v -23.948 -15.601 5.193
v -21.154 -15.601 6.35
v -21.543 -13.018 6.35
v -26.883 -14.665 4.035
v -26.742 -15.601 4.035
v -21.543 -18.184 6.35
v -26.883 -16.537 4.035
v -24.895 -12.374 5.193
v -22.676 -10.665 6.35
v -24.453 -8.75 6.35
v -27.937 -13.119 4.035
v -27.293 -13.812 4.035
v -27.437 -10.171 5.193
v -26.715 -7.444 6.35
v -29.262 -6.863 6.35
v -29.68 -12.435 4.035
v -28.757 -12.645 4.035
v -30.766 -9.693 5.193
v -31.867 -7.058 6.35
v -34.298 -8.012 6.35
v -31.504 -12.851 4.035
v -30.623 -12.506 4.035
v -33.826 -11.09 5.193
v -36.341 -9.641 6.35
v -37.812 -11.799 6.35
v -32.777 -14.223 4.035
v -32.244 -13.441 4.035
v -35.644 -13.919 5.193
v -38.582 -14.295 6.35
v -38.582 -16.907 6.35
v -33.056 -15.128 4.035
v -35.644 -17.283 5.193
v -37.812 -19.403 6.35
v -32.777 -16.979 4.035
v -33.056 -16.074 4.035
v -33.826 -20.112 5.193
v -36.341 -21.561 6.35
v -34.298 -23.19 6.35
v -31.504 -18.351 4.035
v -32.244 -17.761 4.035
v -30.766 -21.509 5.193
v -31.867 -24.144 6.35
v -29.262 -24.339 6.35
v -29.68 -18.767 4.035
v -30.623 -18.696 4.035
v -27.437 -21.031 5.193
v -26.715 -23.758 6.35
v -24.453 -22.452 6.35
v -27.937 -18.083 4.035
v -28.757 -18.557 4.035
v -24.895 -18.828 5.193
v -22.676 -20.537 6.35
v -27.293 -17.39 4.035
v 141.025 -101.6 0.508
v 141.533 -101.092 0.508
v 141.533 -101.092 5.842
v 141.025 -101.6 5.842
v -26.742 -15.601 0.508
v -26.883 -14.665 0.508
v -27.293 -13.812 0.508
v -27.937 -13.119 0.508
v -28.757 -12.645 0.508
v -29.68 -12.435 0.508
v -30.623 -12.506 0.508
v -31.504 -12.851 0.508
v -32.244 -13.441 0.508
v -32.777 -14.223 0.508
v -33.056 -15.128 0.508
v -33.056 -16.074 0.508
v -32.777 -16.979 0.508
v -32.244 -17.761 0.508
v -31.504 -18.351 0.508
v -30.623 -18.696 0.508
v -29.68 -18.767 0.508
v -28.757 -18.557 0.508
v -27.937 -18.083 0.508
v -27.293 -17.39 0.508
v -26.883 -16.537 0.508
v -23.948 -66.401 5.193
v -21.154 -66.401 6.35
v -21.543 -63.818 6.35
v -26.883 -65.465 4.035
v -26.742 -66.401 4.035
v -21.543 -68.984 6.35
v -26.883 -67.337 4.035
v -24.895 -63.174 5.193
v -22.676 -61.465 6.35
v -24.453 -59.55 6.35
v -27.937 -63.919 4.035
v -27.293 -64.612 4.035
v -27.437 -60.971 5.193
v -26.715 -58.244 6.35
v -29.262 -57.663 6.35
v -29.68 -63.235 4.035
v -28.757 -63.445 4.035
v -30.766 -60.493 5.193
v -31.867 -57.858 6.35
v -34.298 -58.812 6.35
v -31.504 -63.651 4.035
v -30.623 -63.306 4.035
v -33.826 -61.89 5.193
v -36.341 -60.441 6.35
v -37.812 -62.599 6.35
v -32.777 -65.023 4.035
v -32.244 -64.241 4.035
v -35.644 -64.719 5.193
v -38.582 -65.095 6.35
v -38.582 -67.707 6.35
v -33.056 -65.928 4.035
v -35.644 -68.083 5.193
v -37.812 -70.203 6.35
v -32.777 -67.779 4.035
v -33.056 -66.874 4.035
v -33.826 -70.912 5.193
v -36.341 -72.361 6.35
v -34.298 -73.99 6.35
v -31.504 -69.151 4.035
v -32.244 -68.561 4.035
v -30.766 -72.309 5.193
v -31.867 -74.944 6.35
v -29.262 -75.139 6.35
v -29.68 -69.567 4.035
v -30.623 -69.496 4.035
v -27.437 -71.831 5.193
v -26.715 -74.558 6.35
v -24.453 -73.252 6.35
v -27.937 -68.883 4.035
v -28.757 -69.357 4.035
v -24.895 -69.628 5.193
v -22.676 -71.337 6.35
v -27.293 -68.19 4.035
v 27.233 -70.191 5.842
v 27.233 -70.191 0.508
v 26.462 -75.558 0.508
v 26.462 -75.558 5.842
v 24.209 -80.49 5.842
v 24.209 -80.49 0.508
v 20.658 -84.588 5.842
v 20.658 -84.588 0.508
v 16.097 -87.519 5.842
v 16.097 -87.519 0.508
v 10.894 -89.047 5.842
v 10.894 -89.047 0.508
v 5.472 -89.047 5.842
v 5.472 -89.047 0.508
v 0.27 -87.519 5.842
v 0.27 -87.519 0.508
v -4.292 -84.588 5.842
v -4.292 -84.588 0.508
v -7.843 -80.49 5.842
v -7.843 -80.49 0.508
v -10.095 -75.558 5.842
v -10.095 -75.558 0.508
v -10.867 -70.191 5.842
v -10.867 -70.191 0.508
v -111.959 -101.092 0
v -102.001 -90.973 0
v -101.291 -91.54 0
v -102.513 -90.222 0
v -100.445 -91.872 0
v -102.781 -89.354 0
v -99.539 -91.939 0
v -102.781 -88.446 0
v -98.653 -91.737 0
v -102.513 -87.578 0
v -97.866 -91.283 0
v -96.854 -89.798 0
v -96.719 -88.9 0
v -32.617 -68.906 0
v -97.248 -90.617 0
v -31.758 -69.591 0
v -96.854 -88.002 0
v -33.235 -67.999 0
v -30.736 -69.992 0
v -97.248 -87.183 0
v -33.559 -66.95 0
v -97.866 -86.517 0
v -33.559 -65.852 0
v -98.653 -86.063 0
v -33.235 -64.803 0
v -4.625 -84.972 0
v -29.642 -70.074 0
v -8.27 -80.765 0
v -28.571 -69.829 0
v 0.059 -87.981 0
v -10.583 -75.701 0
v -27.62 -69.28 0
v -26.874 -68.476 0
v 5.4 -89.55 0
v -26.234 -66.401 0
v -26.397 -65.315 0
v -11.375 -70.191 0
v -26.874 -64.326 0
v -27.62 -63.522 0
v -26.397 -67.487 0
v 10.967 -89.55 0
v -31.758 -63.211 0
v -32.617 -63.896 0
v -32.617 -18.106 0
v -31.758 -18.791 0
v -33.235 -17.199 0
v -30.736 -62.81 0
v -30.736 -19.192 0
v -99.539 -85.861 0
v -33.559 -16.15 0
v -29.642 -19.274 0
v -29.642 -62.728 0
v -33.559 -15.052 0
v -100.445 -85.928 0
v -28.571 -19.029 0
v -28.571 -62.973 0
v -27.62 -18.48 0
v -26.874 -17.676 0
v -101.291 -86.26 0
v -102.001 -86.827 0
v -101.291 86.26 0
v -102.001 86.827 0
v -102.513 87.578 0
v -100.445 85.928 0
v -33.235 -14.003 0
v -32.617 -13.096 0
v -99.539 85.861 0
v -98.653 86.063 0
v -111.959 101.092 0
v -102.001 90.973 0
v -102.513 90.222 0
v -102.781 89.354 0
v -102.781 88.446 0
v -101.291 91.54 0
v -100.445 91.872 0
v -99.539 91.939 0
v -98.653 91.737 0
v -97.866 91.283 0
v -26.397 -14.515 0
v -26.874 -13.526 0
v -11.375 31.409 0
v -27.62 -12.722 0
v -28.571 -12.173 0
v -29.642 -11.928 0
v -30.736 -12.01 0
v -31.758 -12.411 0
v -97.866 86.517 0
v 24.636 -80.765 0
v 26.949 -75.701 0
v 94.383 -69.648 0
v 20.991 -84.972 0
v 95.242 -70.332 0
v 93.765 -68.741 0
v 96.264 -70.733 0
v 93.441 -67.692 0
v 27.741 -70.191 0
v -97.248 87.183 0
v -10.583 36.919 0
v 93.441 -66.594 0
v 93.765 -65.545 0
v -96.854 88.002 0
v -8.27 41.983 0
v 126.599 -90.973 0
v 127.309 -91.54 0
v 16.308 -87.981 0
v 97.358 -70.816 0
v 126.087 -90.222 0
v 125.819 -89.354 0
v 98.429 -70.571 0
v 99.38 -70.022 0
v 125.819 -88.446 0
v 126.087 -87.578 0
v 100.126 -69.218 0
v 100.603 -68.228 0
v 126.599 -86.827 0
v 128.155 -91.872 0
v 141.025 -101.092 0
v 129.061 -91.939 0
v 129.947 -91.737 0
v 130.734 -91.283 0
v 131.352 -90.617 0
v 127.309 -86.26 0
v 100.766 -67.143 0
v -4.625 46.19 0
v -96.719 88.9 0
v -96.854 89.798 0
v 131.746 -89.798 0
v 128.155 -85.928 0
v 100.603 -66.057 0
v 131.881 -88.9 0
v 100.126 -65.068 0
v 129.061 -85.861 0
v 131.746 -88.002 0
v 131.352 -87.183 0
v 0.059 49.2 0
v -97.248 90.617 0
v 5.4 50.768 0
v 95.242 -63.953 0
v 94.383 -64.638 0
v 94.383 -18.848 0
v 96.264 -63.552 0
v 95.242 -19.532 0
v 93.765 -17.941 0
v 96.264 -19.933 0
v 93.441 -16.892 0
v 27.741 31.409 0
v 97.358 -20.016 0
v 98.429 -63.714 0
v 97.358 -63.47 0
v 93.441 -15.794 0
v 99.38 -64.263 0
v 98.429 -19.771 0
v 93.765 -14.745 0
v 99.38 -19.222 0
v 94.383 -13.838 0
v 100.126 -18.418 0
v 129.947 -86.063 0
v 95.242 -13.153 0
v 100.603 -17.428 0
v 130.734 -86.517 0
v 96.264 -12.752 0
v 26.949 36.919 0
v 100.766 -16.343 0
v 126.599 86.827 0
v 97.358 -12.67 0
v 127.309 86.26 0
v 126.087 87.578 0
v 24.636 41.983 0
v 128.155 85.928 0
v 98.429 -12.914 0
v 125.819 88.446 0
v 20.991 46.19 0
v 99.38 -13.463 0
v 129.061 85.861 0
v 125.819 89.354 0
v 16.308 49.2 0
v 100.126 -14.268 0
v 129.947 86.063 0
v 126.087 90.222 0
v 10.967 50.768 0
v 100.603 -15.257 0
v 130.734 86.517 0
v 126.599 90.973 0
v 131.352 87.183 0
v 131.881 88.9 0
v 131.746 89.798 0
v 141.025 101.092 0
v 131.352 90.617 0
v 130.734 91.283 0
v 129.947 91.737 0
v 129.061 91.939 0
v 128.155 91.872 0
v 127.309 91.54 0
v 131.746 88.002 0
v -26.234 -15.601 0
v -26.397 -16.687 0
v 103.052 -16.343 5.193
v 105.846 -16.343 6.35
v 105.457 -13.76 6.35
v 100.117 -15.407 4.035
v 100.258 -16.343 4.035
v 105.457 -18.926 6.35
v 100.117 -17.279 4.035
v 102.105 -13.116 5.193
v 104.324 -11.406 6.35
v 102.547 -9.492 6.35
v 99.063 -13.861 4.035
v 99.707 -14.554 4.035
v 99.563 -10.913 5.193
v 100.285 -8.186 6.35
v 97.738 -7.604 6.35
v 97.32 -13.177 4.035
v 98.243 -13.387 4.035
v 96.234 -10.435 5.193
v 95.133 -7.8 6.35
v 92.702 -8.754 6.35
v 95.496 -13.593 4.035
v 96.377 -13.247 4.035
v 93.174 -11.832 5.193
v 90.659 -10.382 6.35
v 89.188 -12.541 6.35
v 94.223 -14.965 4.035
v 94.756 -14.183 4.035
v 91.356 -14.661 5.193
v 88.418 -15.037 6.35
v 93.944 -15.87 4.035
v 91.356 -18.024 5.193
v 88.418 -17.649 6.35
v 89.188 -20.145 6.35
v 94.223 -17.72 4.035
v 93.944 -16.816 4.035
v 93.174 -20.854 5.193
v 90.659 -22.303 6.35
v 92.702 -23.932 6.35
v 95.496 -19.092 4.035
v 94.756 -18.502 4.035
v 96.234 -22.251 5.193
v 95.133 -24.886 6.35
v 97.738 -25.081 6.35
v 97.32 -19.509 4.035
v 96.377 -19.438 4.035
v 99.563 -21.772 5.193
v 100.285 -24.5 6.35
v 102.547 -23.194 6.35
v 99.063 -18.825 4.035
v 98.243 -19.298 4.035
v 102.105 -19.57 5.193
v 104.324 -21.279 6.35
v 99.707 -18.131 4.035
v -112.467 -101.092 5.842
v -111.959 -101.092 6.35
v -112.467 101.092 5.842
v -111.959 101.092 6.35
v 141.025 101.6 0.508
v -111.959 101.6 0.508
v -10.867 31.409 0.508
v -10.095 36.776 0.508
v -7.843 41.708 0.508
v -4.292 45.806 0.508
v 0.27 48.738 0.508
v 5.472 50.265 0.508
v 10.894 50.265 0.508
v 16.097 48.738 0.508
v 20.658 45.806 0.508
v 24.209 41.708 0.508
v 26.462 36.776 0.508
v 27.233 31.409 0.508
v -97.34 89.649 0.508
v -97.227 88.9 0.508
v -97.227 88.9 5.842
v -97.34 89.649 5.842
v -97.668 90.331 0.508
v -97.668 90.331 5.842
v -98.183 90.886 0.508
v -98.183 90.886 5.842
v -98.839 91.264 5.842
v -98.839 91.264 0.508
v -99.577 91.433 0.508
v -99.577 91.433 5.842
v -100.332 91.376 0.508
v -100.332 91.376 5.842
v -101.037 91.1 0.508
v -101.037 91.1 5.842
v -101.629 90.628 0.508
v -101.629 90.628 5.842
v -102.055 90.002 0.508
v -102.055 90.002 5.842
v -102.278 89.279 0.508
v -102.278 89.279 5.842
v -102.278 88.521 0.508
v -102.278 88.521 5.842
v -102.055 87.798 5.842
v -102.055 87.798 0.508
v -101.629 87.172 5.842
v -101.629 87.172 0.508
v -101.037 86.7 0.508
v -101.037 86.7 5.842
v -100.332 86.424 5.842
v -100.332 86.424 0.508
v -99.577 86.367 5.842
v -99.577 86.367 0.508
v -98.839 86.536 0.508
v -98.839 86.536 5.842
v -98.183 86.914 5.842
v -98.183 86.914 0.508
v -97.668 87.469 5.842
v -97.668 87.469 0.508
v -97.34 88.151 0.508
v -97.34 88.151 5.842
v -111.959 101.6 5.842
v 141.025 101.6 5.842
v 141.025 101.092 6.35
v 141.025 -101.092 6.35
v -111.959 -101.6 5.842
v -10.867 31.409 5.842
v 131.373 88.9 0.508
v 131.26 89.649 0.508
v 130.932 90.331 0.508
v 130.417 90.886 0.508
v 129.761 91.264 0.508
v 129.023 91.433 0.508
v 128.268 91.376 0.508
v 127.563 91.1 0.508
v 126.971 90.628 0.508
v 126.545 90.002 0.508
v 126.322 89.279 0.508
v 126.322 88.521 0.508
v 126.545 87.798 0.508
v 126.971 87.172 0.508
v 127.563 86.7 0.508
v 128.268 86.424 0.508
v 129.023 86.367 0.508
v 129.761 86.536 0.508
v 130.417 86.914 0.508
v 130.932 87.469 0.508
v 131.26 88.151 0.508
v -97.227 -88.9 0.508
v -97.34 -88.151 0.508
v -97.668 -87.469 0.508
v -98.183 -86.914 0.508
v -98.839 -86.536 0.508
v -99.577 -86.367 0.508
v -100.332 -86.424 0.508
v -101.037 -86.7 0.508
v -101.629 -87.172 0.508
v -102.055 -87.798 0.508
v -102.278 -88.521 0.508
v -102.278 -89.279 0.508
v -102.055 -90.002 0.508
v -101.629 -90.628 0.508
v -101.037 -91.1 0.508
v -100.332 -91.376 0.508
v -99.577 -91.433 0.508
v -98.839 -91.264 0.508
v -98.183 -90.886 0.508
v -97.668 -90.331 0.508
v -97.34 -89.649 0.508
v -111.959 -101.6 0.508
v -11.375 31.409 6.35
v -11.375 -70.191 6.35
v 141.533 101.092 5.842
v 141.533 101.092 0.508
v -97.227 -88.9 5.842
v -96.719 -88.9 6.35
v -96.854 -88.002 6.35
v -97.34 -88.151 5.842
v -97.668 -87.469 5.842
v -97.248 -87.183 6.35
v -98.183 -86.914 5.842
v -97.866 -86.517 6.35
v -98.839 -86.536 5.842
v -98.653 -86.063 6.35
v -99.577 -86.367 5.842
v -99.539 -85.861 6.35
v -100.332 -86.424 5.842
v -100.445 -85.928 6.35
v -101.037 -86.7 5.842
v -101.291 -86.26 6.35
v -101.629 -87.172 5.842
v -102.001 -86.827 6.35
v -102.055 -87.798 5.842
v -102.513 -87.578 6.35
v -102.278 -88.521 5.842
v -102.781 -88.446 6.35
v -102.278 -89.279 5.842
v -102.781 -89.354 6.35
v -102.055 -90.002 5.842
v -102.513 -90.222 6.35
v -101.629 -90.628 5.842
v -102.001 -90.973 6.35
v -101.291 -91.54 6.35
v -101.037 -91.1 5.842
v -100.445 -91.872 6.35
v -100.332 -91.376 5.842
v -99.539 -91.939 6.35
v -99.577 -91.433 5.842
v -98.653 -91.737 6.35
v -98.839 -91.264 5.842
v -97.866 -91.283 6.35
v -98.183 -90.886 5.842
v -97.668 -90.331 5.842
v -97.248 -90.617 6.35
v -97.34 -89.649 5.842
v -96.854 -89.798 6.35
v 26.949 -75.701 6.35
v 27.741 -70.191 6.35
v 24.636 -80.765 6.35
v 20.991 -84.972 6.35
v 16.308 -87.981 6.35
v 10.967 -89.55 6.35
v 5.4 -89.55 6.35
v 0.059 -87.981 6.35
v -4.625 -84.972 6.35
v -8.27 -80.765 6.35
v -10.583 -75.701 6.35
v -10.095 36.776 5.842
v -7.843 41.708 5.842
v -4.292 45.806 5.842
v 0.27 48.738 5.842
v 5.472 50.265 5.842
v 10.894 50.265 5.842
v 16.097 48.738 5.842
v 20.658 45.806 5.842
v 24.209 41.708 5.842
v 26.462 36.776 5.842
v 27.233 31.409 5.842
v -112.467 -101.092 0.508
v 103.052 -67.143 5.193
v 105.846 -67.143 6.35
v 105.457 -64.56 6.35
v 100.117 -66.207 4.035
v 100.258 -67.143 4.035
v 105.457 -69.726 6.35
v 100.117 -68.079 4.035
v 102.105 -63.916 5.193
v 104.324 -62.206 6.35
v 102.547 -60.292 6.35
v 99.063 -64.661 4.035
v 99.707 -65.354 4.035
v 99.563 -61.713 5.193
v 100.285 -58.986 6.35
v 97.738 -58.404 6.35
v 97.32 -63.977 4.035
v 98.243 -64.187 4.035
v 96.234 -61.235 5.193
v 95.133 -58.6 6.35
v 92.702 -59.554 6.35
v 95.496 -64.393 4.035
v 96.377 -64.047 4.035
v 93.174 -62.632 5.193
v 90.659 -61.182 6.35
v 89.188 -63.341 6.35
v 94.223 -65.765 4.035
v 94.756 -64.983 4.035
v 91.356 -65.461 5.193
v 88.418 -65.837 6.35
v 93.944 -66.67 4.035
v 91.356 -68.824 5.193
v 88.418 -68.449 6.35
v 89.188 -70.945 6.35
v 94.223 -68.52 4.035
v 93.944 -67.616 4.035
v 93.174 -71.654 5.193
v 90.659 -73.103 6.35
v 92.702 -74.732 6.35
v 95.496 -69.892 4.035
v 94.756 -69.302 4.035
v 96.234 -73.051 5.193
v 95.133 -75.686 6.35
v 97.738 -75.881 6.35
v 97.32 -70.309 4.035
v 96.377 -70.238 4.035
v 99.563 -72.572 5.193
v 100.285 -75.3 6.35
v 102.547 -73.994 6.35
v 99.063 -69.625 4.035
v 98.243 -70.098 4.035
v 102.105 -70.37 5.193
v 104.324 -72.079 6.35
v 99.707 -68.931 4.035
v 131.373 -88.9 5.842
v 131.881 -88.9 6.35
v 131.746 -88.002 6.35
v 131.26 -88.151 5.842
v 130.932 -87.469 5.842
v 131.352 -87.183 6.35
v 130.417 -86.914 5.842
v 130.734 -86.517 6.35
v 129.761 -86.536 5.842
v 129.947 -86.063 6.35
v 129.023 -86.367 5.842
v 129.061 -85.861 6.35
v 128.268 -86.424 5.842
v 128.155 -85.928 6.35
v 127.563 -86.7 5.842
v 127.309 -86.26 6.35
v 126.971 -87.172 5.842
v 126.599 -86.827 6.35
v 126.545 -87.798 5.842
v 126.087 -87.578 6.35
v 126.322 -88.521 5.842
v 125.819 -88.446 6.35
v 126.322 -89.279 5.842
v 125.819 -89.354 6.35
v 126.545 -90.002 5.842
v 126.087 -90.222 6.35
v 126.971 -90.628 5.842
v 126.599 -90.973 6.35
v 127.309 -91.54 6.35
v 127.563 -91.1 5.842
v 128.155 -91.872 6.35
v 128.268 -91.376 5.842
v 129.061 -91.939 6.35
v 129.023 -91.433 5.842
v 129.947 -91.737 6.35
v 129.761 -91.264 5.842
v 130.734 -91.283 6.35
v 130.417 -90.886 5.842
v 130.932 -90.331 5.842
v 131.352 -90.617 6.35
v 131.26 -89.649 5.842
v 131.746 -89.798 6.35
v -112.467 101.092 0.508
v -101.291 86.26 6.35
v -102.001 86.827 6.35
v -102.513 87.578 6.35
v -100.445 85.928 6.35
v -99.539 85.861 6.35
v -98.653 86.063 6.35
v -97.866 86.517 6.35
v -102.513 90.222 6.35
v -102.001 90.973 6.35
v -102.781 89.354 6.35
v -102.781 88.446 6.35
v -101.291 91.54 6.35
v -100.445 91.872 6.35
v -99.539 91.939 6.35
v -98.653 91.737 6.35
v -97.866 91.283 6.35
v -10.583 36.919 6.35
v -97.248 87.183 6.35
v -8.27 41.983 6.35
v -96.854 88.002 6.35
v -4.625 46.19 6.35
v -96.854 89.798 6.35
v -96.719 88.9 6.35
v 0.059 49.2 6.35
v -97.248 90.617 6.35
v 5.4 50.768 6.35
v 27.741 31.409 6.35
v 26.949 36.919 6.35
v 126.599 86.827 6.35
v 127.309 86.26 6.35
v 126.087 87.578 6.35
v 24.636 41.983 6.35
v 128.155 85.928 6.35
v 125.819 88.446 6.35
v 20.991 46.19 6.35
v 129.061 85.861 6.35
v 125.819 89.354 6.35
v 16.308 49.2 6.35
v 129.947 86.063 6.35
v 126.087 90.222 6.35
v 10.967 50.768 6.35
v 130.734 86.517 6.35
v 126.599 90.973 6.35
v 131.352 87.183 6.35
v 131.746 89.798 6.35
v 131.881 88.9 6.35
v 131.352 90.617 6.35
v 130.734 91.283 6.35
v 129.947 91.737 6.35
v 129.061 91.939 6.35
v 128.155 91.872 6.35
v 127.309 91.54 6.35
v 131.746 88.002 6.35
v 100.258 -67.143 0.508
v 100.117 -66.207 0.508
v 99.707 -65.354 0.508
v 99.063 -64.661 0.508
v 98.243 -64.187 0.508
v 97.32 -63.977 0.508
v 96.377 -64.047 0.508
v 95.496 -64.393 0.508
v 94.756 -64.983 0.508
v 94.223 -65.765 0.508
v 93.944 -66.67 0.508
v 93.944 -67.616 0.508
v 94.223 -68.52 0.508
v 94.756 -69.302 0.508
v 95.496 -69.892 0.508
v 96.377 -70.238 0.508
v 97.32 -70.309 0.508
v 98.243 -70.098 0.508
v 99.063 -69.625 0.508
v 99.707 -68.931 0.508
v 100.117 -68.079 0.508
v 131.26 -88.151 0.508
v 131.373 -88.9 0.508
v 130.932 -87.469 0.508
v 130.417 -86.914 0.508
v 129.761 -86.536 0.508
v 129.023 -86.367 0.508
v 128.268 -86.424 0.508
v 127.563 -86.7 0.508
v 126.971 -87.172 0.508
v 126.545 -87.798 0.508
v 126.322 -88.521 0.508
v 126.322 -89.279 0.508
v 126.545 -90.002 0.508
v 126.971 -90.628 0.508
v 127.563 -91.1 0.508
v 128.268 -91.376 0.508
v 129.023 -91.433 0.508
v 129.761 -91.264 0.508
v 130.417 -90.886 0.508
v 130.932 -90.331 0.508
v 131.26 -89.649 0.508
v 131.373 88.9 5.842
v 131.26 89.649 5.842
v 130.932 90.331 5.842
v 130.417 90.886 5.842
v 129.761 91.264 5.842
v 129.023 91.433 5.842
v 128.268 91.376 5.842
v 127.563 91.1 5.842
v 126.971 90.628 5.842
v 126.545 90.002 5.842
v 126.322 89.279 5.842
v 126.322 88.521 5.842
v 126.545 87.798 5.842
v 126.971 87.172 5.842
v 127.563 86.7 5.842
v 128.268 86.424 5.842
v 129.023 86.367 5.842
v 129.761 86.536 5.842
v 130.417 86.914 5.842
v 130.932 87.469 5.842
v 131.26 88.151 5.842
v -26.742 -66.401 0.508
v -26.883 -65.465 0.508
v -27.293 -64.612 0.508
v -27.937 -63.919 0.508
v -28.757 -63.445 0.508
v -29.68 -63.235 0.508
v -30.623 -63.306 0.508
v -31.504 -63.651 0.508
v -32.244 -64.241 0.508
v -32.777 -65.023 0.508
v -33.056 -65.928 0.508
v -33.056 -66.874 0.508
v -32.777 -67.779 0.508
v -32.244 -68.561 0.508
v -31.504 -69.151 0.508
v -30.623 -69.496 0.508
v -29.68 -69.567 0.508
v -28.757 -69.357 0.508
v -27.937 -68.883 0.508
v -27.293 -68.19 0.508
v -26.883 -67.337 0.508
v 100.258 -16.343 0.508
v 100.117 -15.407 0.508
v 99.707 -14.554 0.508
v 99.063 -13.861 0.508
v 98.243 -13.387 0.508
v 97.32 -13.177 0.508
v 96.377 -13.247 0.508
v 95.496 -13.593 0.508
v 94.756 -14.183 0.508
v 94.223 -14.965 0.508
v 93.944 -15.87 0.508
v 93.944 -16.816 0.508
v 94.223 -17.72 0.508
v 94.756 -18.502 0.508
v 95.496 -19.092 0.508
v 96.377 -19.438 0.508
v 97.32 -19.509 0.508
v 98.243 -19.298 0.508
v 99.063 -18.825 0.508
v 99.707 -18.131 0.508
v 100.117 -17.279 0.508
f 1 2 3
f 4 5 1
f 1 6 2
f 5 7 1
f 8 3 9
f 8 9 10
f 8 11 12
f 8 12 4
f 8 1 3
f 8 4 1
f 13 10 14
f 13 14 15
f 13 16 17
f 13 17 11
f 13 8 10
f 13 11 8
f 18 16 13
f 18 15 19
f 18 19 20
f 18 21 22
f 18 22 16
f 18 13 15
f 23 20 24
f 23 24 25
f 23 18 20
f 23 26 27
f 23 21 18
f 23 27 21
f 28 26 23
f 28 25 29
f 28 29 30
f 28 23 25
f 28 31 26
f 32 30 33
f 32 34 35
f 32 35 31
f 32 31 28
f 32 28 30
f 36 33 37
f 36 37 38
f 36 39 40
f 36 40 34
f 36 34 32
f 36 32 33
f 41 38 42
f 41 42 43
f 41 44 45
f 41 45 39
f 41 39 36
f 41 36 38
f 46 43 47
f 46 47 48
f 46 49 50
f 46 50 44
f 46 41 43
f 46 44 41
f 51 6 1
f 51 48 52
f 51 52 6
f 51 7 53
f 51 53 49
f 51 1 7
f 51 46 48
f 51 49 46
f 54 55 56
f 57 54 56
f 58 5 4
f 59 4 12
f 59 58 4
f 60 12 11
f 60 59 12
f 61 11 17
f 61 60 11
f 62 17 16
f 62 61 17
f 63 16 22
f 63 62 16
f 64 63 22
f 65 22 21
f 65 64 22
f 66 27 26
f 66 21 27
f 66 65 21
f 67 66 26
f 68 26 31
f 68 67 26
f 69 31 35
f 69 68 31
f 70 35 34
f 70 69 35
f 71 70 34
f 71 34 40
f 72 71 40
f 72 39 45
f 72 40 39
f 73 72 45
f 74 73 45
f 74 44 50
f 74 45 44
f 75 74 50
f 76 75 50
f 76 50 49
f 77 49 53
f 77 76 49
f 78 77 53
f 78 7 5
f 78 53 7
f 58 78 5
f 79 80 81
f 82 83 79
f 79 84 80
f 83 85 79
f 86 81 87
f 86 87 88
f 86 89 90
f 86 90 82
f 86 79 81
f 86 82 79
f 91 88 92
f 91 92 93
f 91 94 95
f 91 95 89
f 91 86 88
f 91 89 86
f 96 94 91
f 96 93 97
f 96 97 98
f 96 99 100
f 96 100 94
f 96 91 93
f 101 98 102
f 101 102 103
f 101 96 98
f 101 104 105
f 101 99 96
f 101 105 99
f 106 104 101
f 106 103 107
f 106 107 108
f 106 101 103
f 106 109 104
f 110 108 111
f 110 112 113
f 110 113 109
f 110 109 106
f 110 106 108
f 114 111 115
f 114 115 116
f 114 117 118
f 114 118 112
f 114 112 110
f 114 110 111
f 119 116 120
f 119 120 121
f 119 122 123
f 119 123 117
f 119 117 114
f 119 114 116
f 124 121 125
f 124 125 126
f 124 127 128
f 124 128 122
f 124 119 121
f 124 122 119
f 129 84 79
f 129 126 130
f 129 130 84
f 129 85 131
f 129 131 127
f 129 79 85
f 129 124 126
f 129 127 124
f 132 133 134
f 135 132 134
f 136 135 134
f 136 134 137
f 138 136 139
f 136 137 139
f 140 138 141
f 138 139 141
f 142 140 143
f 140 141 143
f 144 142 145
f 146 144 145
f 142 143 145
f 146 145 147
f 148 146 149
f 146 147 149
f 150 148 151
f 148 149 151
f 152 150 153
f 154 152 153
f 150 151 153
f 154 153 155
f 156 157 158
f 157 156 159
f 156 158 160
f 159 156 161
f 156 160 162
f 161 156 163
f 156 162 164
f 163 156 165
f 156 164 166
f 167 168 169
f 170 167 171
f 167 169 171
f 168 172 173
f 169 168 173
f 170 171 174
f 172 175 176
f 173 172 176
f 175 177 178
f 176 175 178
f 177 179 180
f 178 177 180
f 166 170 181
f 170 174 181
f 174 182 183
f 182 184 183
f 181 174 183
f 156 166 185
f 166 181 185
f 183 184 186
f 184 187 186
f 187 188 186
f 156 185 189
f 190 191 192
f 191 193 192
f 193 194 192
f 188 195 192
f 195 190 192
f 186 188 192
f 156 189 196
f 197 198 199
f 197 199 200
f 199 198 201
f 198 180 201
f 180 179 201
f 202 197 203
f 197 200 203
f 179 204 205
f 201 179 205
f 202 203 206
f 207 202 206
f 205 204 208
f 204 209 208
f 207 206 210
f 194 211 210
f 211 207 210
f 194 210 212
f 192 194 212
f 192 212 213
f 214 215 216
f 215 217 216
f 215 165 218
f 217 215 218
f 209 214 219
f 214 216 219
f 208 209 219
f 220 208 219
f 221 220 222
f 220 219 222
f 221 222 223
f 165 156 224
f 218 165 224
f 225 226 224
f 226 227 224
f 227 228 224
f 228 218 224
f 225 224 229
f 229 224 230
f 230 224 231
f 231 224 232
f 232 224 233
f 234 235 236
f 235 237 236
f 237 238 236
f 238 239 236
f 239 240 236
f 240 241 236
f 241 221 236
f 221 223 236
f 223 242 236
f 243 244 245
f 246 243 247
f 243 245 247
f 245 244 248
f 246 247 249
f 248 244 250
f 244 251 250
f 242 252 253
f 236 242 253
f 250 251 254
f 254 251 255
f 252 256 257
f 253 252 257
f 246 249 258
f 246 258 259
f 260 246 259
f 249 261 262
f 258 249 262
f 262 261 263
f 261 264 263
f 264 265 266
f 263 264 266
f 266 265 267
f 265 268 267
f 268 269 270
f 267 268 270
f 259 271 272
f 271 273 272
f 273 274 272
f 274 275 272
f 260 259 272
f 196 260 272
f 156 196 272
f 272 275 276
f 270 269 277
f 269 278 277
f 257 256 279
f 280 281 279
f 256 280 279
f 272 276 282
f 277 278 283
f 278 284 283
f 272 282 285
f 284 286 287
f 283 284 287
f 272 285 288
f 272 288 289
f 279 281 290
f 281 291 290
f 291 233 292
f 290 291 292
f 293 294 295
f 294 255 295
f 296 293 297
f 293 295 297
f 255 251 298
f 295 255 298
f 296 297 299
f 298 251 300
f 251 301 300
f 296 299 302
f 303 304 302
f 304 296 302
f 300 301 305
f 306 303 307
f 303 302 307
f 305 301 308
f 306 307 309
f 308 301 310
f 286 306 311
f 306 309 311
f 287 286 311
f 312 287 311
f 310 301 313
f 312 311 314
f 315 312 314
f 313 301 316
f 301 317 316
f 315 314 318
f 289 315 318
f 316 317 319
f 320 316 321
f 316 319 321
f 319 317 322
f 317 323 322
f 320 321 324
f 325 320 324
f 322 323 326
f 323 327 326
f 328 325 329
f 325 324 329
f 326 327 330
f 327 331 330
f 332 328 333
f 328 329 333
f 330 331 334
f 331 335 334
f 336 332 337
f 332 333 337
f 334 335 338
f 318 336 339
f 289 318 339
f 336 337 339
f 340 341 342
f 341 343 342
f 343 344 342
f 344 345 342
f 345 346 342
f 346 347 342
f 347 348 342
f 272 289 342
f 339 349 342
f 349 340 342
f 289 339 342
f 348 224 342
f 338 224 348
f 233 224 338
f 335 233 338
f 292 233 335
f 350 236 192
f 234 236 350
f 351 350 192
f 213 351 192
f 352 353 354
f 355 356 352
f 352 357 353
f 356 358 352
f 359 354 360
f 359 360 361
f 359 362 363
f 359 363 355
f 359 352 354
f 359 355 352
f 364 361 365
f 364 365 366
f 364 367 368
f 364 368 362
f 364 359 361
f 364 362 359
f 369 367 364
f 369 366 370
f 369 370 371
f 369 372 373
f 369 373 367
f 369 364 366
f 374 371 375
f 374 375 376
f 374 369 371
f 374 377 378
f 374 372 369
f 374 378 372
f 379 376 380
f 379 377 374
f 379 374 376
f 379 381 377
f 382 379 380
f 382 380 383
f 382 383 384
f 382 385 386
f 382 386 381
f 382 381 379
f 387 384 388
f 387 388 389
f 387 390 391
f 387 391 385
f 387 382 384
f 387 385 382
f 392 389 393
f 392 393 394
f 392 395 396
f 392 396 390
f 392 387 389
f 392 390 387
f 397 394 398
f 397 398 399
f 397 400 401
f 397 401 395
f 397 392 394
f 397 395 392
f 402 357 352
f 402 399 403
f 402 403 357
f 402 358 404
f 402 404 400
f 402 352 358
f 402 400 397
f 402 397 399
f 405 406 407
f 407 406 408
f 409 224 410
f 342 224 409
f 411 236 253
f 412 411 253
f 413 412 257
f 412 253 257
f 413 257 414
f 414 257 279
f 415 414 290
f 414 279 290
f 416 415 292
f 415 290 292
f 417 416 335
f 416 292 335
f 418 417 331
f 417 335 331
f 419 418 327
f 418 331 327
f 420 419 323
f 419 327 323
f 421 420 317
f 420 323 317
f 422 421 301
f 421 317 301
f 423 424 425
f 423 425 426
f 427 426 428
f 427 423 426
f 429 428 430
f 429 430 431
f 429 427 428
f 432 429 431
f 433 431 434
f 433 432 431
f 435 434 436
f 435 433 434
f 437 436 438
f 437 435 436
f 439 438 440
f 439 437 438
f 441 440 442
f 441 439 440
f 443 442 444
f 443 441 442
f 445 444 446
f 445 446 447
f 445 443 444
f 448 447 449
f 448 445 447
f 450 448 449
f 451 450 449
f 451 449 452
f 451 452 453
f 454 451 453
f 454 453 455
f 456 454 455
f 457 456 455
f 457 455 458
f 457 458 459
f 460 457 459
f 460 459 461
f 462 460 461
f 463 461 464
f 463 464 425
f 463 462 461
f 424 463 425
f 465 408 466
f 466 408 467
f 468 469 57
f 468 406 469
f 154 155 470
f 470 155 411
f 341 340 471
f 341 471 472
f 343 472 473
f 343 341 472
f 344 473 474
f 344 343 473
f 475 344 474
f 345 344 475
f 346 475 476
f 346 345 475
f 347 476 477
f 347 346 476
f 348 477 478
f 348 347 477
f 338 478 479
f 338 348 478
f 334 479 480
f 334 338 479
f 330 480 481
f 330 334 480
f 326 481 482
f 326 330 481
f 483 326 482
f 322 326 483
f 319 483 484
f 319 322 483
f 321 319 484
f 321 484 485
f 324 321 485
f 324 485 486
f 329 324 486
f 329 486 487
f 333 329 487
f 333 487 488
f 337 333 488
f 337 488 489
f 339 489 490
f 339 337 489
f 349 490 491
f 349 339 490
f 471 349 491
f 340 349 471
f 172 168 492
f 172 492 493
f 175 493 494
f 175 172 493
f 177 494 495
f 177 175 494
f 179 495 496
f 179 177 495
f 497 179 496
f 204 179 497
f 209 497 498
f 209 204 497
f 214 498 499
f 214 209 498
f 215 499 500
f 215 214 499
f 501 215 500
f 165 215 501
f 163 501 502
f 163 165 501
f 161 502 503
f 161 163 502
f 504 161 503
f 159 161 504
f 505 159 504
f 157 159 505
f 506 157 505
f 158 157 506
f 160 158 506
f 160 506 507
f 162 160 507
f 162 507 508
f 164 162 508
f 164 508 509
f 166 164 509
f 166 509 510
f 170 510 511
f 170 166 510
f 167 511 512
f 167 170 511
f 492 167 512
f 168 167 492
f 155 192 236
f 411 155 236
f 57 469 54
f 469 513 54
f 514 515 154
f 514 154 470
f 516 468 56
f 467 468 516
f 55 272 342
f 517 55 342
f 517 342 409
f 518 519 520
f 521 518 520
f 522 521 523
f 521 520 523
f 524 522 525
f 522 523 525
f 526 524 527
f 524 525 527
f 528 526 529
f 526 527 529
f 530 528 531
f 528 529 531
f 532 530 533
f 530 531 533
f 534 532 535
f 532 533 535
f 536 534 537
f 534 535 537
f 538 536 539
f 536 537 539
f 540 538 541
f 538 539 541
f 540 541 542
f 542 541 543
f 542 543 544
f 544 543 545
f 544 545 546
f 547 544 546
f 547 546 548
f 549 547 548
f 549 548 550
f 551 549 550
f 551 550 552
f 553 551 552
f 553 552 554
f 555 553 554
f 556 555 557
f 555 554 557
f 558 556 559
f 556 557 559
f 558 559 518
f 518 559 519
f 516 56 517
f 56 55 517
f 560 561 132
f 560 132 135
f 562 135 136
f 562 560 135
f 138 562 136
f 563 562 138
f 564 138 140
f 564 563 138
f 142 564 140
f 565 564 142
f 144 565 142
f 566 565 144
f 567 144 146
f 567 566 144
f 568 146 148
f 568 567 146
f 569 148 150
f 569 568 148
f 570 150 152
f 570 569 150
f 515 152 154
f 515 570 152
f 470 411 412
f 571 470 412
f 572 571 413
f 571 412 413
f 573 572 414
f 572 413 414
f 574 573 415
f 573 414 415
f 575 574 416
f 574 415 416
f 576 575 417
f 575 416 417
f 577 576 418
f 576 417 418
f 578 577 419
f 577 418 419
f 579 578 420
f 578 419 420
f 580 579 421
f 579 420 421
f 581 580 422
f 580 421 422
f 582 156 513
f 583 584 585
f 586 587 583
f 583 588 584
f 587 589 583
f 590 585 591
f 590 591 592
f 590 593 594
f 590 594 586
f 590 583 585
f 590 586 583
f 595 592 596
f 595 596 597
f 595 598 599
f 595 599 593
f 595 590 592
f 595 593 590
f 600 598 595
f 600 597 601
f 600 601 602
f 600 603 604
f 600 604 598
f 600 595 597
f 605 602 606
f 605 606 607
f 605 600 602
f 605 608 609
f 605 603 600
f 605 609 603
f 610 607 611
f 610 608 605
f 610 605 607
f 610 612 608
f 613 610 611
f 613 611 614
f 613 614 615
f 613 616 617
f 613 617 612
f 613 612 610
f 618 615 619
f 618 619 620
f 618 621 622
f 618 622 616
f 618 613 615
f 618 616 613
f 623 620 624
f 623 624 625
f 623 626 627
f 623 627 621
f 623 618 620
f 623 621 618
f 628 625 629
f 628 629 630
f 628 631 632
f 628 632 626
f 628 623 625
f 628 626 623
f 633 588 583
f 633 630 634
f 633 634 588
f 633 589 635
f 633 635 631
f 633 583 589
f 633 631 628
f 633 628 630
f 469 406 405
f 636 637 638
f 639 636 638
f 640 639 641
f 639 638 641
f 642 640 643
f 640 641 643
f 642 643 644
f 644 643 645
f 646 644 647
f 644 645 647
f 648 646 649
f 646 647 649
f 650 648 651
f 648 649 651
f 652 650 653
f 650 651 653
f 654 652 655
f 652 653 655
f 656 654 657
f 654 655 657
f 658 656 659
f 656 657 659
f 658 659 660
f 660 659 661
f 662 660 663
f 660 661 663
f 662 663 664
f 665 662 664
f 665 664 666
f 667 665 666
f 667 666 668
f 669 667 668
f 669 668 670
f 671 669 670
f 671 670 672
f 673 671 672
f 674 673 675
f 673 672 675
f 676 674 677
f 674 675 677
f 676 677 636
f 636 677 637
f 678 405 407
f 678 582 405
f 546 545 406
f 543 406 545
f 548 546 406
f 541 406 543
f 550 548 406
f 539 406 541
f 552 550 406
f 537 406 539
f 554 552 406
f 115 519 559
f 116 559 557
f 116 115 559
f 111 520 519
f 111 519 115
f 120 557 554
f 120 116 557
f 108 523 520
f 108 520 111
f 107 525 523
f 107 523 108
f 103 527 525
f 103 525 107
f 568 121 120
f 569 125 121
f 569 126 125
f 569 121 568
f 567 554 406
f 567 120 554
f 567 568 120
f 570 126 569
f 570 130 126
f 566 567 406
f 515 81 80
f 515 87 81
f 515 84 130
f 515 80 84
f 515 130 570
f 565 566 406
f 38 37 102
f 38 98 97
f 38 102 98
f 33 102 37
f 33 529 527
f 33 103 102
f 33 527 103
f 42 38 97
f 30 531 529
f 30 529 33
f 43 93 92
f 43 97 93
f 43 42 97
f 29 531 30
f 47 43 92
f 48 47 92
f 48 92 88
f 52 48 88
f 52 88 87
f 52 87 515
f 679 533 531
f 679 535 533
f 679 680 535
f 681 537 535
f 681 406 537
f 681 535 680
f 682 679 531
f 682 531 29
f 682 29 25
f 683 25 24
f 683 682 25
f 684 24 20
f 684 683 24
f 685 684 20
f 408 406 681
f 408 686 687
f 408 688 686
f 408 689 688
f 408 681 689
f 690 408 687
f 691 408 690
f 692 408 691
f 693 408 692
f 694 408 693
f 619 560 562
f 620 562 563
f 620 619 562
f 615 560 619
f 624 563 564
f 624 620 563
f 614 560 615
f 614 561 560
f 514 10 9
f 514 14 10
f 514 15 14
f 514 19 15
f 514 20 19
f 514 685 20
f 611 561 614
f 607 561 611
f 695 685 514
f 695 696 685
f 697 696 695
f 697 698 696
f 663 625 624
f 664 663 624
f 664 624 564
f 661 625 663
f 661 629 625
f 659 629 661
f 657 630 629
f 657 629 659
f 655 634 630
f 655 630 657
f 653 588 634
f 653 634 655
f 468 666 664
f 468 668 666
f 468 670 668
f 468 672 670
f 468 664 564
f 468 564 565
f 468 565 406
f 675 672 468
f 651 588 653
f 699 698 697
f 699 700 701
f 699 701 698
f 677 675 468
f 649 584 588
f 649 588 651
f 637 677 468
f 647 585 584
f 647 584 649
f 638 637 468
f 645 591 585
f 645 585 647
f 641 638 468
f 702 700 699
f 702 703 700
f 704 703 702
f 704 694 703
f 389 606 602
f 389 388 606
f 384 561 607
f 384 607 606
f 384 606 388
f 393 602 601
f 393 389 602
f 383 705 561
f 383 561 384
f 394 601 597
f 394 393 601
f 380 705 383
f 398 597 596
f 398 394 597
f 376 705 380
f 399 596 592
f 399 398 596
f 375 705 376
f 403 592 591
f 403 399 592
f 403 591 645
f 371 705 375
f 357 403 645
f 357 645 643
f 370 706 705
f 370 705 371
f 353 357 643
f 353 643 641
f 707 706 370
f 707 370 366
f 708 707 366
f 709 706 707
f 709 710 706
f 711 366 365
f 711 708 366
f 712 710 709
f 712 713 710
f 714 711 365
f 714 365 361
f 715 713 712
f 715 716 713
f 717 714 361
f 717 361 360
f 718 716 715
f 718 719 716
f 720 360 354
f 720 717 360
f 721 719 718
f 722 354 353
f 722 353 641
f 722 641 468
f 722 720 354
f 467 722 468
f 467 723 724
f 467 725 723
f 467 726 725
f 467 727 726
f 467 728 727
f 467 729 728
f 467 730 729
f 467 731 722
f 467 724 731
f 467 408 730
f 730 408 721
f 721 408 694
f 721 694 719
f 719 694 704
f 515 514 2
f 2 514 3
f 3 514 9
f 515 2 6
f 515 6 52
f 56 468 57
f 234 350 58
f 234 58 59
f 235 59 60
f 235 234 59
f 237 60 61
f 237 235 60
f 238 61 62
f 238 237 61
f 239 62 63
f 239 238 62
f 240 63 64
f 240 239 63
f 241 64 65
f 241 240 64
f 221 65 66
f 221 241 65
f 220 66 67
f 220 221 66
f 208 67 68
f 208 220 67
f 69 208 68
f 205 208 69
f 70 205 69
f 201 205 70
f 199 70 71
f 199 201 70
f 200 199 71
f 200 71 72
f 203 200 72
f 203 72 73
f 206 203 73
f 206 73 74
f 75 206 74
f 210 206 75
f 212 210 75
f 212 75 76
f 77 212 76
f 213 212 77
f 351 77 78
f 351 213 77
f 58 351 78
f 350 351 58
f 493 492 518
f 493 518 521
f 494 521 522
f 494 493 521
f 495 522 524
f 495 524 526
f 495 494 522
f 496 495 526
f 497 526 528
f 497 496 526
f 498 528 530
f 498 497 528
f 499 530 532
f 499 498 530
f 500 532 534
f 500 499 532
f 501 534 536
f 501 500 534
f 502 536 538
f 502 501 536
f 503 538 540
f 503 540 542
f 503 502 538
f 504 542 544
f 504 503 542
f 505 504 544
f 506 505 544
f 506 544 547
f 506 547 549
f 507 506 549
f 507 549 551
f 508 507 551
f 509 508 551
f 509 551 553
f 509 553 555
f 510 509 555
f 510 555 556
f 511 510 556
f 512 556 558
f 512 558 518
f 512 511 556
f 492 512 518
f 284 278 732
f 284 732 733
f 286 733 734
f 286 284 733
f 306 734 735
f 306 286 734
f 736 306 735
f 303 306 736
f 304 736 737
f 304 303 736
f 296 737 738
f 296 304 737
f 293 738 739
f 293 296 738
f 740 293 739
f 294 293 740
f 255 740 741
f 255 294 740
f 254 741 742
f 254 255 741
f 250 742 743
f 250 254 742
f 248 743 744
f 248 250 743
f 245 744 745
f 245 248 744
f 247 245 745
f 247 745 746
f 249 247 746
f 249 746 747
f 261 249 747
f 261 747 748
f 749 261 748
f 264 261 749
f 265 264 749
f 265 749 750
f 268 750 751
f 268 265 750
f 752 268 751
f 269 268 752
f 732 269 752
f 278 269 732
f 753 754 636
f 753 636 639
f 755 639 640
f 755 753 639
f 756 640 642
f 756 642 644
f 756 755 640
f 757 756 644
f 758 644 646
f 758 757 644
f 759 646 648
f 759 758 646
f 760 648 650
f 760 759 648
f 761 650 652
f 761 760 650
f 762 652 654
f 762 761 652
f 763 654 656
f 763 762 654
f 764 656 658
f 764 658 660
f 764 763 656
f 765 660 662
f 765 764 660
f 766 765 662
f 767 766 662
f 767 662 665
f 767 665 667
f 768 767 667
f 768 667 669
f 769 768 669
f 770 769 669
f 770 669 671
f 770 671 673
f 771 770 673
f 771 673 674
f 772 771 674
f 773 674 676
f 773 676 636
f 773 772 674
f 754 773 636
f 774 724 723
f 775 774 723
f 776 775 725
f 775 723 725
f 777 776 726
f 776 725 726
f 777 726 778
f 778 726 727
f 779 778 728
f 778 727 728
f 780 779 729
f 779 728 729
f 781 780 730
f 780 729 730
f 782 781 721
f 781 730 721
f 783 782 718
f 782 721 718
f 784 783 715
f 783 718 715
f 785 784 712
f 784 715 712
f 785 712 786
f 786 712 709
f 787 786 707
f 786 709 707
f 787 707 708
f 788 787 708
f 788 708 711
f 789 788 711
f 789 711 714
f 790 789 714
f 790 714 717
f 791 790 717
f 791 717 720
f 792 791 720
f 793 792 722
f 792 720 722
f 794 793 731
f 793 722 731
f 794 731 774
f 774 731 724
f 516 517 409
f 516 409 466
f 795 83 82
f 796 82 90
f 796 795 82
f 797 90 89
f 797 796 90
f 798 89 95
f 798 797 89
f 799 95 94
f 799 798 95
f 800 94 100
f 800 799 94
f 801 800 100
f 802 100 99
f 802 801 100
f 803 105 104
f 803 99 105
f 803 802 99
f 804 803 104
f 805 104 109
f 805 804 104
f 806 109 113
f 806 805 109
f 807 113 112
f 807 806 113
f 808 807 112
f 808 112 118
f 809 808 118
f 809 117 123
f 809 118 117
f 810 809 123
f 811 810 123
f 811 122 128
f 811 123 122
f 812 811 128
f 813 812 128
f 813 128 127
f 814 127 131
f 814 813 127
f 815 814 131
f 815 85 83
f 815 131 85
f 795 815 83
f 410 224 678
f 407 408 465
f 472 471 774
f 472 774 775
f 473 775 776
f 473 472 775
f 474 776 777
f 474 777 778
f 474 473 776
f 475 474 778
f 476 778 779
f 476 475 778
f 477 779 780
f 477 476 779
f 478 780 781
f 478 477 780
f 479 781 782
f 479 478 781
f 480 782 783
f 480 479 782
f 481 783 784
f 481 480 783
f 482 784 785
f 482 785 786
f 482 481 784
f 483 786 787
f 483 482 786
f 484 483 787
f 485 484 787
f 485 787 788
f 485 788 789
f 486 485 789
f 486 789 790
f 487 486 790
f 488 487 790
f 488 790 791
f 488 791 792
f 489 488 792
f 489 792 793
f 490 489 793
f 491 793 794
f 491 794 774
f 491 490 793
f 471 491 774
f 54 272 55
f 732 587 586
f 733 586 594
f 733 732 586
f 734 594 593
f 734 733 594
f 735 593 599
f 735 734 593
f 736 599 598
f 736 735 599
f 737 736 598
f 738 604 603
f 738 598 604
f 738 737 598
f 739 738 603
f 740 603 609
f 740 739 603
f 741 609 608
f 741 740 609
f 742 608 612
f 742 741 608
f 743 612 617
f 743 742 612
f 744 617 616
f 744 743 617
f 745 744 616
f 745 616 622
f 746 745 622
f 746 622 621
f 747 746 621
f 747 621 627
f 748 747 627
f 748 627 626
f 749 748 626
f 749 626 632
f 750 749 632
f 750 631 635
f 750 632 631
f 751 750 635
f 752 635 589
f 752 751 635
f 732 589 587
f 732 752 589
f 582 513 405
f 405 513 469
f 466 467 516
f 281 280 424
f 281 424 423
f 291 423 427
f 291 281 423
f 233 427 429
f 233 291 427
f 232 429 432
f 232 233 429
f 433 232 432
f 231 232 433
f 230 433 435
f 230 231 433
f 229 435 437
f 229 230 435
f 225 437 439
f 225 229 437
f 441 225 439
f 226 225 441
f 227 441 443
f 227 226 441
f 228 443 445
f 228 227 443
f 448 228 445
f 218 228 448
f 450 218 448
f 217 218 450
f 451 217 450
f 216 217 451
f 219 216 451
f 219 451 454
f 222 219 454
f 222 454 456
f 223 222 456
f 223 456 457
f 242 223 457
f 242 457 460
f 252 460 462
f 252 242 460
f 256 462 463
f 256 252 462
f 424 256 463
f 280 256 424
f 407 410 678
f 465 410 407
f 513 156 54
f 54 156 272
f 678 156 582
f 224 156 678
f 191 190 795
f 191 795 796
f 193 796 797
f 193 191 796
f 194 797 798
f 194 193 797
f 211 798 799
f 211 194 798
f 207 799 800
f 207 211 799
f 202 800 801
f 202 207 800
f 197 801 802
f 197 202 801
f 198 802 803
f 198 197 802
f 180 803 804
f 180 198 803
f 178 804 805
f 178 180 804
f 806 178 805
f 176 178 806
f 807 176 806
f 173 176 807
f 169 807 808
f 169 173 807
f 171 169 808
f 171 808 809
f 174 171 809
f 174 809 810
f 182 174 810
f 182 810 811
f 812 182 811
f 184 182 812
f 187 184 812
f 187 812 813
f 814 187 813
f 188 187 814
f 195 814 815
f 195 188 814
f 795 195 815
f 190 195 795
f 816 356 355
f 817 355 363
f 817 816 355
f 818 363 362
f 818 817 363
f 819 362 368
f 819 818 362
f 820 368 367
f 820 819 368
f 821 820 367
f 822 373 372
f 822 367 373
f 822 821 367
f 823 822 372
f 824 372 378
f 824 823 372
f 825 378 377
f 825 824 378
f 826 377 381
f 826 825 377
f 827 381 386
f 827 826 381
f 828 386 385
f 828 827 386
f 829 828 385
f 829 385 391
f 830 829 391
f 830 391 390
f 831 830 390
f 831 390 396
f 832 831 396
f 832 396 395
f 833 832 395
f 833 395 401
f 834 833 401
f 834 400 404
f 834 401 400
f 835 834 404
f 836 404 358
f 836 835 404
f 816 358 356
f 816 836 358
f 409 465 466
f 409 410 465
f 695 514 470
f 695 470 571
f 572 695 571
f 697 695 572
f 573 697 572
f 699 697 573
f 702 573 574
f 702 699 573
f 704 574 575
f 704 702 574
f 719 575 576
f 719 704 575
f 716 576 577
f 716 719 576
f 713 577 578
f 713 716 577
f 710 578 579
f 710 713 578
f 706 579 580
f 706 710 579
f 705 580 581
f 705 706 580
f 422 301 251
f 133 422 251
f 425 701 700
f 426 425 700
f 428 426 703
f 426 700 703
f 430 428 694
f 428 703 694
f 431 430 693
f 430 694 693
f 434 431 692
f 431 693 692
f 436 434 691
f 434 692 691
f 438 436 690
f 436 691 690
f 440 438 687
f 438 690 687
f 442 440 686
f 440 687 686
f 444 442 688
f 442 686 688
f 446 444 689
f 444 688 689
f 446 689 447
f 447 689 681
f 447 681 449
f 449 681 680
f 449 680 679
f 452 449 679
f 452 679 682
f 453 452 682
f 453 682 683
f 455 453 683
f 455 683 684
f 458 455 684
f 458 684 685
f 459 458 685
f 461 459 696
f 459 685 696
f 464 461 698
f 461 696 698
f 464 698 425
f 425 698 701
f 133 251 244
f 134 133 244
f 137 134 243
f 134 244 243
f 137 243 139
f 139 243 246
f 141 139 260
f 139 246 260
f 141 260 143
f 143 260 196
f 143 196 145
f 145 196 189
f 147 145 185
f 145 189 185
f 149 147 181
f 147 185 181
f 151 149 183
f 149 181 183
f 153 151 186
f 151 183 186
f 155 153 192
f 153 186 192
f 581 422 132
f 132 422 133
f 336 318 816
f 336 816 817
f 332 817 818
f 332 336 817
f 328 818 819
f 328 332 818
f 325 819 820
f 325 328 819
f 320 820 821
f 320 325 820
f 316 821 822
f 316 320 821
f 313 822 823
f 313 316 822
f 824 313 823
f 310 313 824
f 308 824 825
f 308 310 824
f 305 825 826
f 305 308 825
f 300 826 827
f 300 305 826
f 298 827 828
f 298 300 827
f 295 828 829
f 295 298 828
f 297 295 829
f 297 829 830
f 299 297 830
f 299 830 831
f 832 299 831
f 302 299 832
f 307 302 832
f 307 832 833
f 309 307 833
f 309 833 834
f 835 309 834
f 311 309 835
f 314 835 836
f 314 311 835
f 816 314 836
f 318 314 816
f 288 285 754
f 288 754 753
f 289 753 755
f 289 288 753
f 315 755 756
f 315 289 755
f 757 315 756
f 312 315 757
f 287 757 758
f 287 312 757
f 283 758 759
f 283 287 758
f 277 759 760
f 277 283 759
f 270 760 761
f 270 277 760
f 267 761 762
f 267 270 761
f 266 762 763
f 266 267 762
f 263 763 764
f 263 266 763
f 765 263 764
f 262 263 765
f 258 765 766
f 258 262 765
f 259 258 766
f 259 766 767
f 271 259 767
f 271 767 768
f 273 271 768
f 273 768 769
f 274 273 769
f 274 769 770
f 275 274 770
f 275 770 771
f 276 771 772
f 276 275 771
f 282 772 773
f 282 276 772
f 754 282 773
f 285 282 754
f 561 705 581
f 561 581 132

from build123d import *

# Parameters (mm, degrees)
F0_W     = 254
F0_H     = 203.2
F0_R     = 2.54
F0_R_2   = 3.175
F1_DEPTH = 6.35
F2_SIZE  = 0.508


# Not quite as in the source:
# - a fillet or chamfer that OpenCascade refuses, or shapes differently, is made with other operations: its cross-section is extruded or revolved along the edge and cut away or added


with BuildPart() as f1:
    # F0 (on Top) → F1 (new body)
    with BuildSketch(Plane.XY):
        with Locations((14.533196536, 0)):
            Rectangle(F0_W, F0_H)
        with Locations((-99.766803464, -88.9)):
            Circle(F0_R, mode=Mode.SUBTRACT)
        with Locations((-29.9168042839, -66.4009973407)):
            Circle(F0_R_2, mode=Mode.SUBTRACT)
        with Locations((-29.9168042839, -15.6009973407)):
            Circle(F0_R_2, mode=Mode.SUBTRACT)
        with BuildLine():
            ThreePointArc((27.2331968829, -70.1908171177), (8.1831968829, -89.2408171177), (-10.8668031171, -70.1908171177))
            Line((-10.8668031171, -70.1908171177), (-10.8668031171, 31.4091828823))
            ThreePointArc((-10.8668031171, 31.4091828823), (8.1831968829, 50.4591828823), (27.2331968829, 31.4091828823))
            Line((27.2331968829, 31.4091828823), (27.2331968829, -70.1908171177))
        make_face(mode=Mode.SUBTRACT)
        with Locations((128.833196536, -88.9)):
            Circle(F0_R, mode=Mode.SUBTRACT)
        with Locations((97.0831957161, -67.1428190649)):
            Circle(F0_R_2, mode=Mode.SUBTRACT)
        with Locations((97.0831957161, -16.3428190649)):
            Circle(F0_R_2, mode=Mode.SUBTRACT)
        with Locations((-99.766803464, 88.9)):
            Circle(F0_R, mode=Mode.SUBTRACT)
        with Locations((128.833196536, 88.9)):
            Circle(F0_R, mode=Mode.SUBTRACT)
    extrude(amount=F1_DEPTH)

    # F2
    f2_edges = [f1.edges().sort_by_distance(p)[0] for p in [
        (14.533197, -101.6, 6.35),
        (141.533197, 0, 6.35),
        (14.533197, 101.6, 6.35),
        (-112.466803, 0, 6.35),
        (-102.306803, -88.9, 6.35),
        (-33.091804, -66.400997, 6.35),
        (-33.091804, -15.600997, 6.35),
        (8.183197, 50.459183, 6.35),
        (27.233197, -19.390817, 6.35),
        (8.183197, -89.240817, 6.35),
        (-10.866803, -19.390817, 6.35),
        (126.293197, -88.9, 6.35),
        (93.908196, -67.142819, 6.35),
        (93.908196, -16.342819, 6.35),
        (-102.306803, 88.9, 6.35),
        (126.293197, 88.9, 6.35),
        (14.533197, -101.6, 0),
        (141.533197, 0, 0),
        (14.533197, 101.6, 0),
        (-112.466803, 0, 0),
        (-102.306803, -88.9, 0),
        (-33.091804, -66.400997, 0),
        (-33.091804, -15.600997, 0),
        (8.183197, 50.459183, 0),
        (27.233197, -19.390817, 0),
        (8.183197, -89.240817, 0),
        (-10.866803, -19.390817, 0),
        (126.293197, -88.9, 0),
        (93.908196, -67.142819, 0),
        (93.908196, -16.342819, 0),
        (-102.306803, 88.9, 0),
        (126.293197, 88.9, 0),
        (-112.466803, -101.6, 3.175),
        (-112.466803, 101.6, 3.175),
        (141.533197, -101.6, 3.175),
        (141.533197, 101.6, 3.175),
    ]]
    chamfer(f2_edges, length=F2_SIZE)

    # F3: chamfer of 5.08 on 4 edges, made by hand

    # F3_s1 → F3_t2 (revolve, cut)
    with BuildSketch(Plane.XZ.offset(66.4009973407)):
        Polygon((-21.1538042839, 6.35), (-29.8259067323, 2.7578975516), (-26.2338042839, 6.35), align=None)
    revolve(axis=Axis((-29.9168042839, -66.4009973407, 6.35), (0, 0, 1)), mode=Mode.SUBTRACT)

    # F3_s3 → F3_t4 (revolve, cut)
    with BuildSketch(Plane.XZ.offset(15.6009973407)):
        Polygon((-21.1538042839, 6.35), (-29.8259067323, 2.7578975516), (-26.2338042839, 6.35), align=None)
    revolve(axis=Axis((-29.9168042839, -15.6009973407, 6.35), (0, 0, 1)), mode=Mode.SUBTRACT)

    # F3_s5 → F3_t6 (revolve, cut)
    with BuildSketch(Plane.XZ.offset(67.1428190649)):
        Polygon((105.8461957161, 6.35), (97.1740932677, 2.7578975516), (100.7661957161, 6.35), align=None)
    revolve(axis=Axis((97.0831957161, -67.1428190649, 6.35), (0, 0, 1)), mode=Mode.SUBTRACT)

    # F3_s7 → F3_t8 (revolve, cut)
    with BuildSketch(Plane.XZ.offset(16.3428190649)):
        Polygon((105.8461957161, 6.35), (97.1740932677, 2.7578975516), (100.7661957161, 6.35), align=None)
    revolve(axis=Axis((97.0831957161, -16.3428190649, 6.35), (0, 0, 1)), mode=Mode.SUBTRACT)


solid = f1.part
